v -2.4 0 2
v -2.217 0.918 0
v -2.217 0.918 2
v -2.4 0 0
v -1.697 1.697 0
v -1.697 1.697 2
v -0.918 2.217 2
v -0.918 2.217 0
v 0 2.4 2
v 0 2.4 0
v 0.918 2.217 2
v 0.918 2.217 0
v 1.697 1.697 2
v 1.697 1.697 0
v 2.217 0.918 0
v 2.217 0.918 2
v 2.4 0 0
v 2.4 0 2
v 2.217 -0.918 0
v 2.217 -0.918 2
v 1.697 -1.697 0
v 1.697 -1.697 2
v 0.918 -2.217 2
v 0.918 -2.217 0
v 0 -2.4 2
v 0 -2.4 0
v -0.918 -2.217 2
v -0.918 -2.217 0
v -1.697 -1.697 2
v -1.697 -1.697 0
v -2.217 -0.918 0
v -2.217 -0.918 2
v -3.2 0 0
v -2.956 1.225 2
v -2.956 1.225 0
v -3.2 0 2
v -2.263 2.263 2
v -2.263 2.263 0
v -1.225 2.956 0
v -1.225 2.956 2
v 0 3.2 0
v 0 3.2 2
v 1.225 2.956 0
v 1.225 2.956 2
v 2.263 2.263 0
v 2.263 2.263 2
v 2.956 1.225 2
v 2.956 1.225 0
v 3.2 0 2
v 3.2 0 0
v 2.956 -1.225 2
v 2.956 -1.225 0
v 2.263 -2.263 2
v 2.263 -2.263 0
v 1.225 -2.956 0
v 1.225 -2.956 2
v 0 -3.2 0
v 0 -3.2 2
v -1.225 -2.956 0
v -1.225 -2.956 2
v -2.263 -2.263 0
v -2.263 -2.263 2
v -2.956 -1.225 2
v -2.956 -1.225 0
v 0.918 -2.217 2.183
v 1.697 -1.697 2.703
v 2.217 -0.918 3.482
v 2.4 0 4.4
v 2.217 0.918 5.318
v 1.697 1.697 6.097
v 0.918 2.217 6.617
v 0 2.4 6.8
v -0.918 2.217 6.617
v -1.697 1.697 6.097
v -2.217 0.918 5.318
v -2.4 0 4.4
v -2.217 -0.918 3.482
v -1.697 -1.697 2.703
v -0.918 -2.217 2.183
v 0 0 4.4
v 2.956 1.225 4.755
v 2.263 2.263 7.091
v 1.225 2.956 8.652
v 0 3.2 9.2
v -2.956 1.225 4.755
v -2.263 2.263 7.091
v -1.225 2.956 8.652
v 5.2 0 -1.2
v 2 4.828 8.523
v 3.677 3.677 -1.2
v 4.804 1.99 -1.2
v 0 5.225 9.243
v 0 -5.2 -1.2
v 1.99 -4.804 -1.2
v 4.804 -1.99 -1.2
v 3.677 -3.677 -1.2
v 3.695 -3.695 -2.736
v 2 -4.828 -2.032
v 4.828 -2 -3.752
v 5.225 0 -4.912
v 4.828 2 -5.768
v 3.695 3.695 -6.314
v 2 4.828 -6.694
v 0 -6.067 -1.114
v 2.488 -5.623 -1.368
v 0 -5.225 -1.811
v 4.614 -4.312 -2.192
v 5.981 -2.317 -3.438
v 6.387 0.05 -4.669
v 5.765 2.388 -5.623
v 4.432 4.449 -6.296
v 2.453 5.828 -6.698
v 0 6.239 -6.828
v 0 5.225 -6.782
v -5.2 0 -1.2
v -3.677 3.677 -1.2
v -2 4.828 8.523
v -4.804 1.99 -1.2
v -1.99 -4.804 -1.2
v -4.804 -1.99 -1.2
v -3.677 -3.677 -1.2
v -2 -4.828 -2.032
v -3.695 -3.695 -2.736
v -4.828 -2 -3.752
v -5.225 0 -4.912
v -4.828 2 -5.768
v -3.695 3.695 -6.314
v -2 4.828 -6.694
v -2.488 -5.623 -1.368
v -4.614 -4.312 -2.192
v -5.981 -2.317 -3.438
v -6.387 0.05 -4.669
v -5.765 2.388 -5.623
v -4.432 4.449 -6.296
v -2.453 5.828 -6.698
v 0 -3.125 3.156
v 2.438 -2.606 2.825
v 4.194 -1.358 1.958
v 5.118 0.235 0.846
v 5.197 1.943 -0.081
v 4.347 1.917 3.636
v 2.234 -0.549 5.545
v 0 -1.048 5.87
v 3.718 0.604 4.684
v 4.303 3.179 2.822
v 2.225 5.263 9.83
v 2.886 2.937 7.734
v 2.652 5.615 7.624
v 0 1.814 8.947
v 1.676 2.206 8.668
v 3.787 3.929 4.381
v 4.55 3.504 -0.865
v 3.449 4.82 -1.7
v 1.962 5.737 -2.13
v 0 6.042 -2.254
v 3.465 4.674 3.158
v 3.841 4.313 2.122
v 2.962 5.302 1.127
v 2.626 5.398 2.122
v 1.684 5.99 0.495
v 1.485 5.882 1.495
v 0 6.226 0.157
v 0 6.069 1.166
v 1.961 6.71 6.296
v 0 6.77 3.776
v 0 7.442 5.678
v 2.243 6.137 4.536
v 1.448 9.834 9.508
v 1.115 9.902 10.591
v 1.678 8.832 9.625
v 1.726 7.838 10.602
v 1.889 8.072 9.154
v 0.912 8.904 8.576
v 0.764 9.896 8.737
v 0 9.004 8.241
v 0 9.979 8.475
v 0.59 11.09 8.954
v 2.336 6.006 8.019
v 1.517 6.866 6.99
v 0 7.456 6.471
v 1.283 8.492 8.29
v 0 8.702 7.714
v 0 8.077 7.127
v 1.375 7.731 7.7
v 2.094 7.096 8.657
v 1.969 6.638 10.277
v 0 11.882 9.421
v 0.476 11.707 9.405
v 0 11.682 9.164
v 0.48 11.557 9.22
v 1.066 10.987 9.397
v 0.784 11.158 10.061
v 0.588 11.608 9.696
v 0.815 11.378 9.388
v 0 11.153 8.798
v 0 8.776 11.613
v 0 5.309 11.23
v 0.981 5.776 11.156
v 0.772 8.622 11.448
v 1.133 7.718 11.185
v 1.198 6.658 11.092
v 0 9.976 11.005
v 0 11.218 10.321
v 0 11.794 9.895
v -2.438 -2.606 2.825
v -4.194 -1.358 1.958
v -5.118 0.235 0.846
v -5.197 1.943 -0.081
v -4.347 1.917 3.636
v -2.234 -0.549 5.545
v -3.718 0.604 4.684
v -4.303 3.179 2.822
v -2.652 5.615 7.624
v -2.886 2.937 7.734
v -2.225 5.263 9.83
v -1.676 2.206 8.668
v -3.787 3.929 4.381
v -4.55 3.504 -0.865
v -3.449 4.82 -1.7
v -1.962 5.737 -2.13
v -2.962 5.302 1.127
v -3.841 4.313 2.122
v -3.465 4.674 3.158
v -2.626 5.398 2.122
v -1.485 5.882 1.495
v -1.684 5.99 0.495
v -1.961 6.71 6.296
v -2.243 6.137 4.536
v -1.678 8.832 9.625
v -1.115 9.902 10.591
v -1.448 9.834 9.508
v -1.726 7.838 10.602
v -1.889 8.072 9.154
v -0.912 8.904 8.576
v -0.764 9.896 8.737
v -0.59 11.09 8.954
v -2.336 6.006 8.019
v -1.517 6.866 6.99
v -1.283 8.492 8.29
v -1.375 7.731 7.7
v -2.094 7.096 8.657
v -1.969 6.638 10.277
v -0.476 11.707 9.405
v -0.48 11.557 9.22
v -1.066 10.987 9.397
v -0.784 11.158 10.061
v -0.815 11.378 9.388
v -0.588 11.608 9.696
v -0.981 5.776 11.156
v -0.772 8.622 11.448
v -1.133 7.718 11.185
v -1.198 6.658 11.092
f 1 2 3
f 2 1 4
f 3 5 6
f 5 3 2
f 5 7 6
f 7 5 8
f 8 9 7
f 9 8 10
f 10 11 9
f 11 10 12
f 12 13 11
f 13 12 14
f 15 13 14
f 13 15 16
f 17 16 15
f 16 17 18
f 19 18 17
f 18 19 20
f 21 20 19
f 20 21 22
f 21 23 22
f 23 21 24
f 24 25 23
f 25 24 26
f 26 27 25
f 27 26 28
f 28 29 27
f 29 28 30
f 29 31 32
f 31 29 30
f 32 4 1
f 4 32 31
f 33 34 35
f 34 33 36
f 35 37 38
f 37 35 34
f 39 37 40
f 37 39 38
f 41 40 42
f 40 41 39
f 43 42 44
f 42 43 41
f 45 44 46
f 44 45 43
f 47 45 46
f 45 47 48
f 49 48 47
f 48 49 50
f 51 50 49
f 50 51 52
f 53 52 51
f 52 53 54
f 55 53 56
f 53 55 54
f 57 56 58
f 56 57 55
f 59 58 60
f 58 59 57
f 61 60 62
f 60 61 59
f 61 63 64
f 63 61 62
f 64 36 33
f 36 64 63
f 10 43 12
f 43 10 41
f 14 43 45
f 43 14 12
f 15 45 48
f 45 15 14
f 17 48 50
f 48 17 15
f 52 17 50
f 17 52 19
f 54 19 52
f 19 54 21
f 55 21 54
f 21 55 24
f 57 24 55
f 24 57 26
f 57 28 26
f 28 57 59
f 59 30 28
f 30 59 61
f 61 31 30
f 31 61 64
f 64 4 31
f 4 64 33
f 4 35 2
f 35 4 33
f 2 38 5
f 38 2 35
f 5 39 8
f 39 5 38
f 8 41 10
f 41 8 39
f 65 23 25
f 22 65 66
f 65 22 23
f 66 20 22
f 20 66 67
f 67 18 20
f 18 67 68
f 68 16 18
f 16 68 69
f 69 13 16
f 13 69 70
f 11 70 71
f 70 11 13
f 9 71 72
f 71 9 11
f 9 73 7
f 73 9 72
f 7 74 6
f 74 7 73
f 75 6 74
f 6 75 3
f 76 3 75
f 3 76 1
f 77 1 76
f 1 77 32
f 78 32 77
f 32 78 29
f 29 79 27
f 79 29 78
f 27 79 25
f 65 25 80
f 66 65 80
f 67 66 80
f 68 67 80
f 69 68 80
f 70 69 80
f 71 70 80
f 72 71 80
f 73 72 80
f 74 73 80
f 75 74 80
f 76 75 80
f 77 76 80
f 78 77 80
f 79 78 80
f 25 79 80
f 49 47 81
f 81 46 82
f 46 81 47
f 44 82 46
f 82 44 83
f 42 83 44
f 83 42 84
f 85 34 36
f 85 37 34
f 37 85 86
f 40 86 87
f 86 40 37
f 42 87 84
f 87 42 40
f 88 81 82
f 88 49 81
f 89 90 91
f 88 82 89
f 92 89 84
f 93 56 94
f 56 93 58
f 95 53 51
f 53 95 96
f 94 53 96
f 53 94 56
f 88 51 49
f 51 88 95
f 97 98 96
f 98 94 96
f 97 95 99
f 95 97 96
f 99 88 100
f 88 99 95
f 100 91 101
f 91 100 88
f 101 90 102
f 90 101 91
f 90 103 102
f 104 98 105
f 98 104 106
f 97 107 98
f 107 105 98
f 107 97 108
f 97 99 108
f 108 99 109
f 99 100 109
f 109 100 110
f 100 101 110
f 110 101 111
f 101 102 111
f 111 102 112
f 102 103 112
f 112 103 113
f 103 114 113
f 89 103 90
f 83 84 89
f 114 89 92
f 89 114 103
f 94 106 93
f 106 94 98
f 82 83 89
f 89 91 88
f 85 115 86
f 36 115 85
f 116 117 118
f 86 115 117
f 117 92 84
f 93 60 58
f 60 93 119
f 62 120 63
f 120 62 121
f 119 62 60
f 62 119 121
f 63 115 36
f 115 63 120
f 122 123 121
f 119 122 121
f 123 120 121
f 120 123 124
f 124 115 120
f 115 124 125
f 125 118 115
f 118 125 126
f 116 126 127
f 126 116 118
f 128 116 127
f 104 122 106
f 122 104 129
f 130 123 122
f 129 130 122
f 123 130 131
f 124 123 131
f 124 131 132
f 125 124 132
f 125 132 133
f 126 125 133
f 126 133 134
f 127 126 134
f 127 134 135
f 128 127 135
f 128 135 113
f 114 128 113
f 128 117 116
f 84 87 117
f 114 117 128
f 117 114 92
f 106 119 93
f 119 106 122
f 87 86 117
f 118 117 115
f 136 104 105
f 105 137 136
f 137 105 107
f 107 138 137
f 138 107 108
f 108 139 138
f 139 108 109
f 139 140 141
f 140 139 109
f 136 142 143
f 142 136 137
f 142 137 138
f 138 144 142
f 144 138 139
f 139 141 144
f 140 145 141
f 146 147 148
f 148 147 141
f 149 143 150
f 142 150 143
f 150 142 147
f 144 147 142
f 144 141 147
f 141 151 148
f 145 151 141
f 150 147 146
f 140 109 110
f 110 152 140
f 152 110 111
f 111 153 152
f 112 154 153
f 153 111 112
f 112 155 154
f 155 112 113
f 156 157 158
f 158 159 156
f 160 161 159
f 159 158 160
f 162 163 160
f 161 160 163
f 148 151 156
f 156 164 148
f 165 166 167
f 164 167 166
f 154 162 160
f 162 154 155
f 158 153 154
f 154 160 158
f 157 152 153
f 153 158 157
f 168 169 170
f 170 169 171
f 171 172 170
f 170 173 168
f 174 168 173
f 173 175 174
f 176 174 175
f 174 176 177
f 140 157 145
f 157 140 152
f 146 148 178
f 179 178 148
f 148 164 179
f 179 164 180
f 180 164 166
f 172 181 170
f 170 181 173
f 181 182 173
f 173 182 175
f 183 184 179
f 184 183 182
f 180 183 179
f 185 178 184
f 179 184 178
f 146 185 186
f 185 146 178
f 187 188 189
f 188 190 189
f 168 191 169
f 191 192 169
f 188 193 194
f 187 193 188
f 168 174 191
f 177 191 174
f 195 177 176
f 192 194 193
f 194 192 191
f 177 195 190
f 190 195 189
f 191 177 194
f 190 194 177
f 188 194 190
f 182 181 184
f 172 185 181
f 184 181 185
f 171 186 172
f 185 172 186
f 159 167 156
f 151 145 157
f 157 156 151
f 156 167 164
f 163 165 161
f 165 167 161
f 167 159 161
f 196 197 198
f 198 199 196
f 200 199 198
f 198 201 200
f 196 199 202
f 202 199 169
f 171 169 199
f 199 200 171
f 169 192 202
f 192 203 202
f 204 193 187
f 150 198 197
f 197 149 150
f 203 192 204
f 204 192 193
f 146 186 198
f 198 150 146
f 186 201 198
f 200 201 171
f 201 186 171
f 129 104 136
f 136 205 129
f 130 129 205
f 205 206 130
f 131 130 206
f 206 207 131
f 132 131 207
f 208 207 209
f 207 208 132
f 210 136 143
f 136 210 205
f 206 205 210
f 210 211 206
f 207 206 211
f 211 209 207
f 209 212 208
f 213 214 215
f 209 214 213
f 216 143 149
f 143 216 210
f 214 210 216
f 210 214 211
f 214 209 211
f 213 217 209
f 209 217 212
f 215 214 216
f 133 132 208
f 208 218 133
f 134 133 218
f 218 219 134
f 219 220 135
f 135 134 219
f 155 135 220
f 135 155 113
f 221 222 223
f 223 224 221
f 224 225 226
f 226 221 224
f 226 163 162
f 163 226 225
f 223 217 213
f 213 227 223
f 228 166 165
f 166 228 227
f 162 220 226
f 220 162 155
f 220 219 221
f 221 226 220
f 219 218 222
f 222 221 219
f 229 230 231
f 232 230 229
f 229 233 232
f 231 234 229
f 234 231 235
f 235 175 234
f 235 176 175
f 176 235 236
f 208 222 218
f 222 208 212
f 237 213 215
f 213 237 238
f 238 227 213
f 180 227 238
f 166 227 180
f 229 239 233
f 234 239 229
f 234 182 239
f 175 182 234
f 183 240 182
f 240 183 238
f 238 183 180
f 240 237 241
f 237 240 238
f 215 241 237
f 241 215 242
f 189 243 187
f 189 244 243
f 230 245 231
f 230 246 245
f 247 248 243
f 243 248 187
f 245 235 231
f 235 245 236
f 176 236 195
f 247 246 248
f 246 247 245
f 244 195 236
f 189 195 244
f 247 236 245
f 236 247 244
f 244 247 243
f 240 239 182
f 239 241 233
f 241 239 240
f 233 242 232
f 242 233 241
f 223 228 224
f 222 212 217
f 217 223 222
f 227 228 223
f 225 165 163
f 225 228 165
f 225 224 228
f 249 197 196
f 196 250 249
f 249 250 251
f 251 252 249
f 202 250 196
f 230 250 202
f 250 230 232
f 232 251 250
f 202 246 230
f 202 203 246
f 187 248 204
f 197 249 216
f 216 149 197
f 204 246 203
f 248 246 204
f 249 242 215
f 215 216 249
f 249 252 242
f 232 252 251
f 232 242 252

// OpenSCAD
use <../lib.scad>
use <s/17349s01.scad>
use <s/17349s02.scad>
use <s/17349s03.scad>
use <s/17349s04.scad>
function ldraw_lib__17349() = [
// 0 Minifig Hat Wizard without Brim
// 0 Name: 17349.dat
// 0 Author: Philippe Hurbain [Philo]
// 0 !LDRAW_ORG Part UPDATE 2022-01
// 0 !LICENSE Licensed under CC BY 4.0 : see CAreadme.txt
// 
// 0 BFC CERTIFY CCW
  [0,"BFC","CERTIFY"],
  [0,"BFC","CCW"],
// 
// 0 !CATEGORY Minifig Headwear
// 0 !KEYWORDS cone, drooping, sorcerer
// 
// 0 !HISTORY 2014-10-16 {LEGO Digital Designer} Original part shape
// 0 !HISTORY 2019-05-16 [Philo] File preparation for LDraw Parts Tracker
// 0 !HISTORY 2022-01-14 [PTadmin] Official Update 2022-01
// 
// 
// 1 16 0 0 0 1 0 0 0 1 0 0 0 1 s\17349s04.dat
  [1,16,0,0,0,1,0,0,0,1,0,0,0,1, ldraw_lib__s__17349s04()],
// 1 16 0 0 0 1 0 0 0 1 0 0 0 1 s\17349s01.dat
  [1,16,0,0,0,1,0,0,0,1,0,0,0,1, ldraw_lib__s__17349s01()],
// 1 16 0 0 0 1 0 0 0 1 0 0 0 1 s\17349s02.dat
  [1,16,0,0,0,1,0,0,0,1,0,0,0,1, ldraw_lib__s__17349s02()],
// 1 16 0 0 0 1 0 0 0 1 0 0 0 1 s\17349s03.dat
  [1,16,0,0,0,1,0,0,0,1,0,0,0,1, ldraw_lib__s__17349s03()],
// 1 16 0 0 0 -1 0 0 0 1 0 0 0 1 s\17349s01.dat
  [1,16,0,0,0,-1,0,0,0,1,0,0,0,1, ldraw_lib__s__17349s01()],
// 1 16 0 0 0 -1 0 0 0 1 0 0 0 1 s\17349s02.dat
  [1,16,0,0,0,-1,0,0,0,1,0,0,0,1, ldraw_lib__s__17349s02()],
// 1 16 0 0 0 -1 0 0 0 1 0 0 0 1 s\17349s03.dat
  [1,16,0,0,0,-1,0,0,0,1,0,0,0,1, ldraw_lib__s__17349s03()],
];
module ldraw_lib__17349(step=0, col=false, unit=2/5, alt=false, line=0.2, solid=!$preview)
    makepoly(ldraw_lib__17349(), step=step, col=col, unit=unit, alt=alt, line=line, solid=solid);
ldraw_lib__17349(line=0.2);
